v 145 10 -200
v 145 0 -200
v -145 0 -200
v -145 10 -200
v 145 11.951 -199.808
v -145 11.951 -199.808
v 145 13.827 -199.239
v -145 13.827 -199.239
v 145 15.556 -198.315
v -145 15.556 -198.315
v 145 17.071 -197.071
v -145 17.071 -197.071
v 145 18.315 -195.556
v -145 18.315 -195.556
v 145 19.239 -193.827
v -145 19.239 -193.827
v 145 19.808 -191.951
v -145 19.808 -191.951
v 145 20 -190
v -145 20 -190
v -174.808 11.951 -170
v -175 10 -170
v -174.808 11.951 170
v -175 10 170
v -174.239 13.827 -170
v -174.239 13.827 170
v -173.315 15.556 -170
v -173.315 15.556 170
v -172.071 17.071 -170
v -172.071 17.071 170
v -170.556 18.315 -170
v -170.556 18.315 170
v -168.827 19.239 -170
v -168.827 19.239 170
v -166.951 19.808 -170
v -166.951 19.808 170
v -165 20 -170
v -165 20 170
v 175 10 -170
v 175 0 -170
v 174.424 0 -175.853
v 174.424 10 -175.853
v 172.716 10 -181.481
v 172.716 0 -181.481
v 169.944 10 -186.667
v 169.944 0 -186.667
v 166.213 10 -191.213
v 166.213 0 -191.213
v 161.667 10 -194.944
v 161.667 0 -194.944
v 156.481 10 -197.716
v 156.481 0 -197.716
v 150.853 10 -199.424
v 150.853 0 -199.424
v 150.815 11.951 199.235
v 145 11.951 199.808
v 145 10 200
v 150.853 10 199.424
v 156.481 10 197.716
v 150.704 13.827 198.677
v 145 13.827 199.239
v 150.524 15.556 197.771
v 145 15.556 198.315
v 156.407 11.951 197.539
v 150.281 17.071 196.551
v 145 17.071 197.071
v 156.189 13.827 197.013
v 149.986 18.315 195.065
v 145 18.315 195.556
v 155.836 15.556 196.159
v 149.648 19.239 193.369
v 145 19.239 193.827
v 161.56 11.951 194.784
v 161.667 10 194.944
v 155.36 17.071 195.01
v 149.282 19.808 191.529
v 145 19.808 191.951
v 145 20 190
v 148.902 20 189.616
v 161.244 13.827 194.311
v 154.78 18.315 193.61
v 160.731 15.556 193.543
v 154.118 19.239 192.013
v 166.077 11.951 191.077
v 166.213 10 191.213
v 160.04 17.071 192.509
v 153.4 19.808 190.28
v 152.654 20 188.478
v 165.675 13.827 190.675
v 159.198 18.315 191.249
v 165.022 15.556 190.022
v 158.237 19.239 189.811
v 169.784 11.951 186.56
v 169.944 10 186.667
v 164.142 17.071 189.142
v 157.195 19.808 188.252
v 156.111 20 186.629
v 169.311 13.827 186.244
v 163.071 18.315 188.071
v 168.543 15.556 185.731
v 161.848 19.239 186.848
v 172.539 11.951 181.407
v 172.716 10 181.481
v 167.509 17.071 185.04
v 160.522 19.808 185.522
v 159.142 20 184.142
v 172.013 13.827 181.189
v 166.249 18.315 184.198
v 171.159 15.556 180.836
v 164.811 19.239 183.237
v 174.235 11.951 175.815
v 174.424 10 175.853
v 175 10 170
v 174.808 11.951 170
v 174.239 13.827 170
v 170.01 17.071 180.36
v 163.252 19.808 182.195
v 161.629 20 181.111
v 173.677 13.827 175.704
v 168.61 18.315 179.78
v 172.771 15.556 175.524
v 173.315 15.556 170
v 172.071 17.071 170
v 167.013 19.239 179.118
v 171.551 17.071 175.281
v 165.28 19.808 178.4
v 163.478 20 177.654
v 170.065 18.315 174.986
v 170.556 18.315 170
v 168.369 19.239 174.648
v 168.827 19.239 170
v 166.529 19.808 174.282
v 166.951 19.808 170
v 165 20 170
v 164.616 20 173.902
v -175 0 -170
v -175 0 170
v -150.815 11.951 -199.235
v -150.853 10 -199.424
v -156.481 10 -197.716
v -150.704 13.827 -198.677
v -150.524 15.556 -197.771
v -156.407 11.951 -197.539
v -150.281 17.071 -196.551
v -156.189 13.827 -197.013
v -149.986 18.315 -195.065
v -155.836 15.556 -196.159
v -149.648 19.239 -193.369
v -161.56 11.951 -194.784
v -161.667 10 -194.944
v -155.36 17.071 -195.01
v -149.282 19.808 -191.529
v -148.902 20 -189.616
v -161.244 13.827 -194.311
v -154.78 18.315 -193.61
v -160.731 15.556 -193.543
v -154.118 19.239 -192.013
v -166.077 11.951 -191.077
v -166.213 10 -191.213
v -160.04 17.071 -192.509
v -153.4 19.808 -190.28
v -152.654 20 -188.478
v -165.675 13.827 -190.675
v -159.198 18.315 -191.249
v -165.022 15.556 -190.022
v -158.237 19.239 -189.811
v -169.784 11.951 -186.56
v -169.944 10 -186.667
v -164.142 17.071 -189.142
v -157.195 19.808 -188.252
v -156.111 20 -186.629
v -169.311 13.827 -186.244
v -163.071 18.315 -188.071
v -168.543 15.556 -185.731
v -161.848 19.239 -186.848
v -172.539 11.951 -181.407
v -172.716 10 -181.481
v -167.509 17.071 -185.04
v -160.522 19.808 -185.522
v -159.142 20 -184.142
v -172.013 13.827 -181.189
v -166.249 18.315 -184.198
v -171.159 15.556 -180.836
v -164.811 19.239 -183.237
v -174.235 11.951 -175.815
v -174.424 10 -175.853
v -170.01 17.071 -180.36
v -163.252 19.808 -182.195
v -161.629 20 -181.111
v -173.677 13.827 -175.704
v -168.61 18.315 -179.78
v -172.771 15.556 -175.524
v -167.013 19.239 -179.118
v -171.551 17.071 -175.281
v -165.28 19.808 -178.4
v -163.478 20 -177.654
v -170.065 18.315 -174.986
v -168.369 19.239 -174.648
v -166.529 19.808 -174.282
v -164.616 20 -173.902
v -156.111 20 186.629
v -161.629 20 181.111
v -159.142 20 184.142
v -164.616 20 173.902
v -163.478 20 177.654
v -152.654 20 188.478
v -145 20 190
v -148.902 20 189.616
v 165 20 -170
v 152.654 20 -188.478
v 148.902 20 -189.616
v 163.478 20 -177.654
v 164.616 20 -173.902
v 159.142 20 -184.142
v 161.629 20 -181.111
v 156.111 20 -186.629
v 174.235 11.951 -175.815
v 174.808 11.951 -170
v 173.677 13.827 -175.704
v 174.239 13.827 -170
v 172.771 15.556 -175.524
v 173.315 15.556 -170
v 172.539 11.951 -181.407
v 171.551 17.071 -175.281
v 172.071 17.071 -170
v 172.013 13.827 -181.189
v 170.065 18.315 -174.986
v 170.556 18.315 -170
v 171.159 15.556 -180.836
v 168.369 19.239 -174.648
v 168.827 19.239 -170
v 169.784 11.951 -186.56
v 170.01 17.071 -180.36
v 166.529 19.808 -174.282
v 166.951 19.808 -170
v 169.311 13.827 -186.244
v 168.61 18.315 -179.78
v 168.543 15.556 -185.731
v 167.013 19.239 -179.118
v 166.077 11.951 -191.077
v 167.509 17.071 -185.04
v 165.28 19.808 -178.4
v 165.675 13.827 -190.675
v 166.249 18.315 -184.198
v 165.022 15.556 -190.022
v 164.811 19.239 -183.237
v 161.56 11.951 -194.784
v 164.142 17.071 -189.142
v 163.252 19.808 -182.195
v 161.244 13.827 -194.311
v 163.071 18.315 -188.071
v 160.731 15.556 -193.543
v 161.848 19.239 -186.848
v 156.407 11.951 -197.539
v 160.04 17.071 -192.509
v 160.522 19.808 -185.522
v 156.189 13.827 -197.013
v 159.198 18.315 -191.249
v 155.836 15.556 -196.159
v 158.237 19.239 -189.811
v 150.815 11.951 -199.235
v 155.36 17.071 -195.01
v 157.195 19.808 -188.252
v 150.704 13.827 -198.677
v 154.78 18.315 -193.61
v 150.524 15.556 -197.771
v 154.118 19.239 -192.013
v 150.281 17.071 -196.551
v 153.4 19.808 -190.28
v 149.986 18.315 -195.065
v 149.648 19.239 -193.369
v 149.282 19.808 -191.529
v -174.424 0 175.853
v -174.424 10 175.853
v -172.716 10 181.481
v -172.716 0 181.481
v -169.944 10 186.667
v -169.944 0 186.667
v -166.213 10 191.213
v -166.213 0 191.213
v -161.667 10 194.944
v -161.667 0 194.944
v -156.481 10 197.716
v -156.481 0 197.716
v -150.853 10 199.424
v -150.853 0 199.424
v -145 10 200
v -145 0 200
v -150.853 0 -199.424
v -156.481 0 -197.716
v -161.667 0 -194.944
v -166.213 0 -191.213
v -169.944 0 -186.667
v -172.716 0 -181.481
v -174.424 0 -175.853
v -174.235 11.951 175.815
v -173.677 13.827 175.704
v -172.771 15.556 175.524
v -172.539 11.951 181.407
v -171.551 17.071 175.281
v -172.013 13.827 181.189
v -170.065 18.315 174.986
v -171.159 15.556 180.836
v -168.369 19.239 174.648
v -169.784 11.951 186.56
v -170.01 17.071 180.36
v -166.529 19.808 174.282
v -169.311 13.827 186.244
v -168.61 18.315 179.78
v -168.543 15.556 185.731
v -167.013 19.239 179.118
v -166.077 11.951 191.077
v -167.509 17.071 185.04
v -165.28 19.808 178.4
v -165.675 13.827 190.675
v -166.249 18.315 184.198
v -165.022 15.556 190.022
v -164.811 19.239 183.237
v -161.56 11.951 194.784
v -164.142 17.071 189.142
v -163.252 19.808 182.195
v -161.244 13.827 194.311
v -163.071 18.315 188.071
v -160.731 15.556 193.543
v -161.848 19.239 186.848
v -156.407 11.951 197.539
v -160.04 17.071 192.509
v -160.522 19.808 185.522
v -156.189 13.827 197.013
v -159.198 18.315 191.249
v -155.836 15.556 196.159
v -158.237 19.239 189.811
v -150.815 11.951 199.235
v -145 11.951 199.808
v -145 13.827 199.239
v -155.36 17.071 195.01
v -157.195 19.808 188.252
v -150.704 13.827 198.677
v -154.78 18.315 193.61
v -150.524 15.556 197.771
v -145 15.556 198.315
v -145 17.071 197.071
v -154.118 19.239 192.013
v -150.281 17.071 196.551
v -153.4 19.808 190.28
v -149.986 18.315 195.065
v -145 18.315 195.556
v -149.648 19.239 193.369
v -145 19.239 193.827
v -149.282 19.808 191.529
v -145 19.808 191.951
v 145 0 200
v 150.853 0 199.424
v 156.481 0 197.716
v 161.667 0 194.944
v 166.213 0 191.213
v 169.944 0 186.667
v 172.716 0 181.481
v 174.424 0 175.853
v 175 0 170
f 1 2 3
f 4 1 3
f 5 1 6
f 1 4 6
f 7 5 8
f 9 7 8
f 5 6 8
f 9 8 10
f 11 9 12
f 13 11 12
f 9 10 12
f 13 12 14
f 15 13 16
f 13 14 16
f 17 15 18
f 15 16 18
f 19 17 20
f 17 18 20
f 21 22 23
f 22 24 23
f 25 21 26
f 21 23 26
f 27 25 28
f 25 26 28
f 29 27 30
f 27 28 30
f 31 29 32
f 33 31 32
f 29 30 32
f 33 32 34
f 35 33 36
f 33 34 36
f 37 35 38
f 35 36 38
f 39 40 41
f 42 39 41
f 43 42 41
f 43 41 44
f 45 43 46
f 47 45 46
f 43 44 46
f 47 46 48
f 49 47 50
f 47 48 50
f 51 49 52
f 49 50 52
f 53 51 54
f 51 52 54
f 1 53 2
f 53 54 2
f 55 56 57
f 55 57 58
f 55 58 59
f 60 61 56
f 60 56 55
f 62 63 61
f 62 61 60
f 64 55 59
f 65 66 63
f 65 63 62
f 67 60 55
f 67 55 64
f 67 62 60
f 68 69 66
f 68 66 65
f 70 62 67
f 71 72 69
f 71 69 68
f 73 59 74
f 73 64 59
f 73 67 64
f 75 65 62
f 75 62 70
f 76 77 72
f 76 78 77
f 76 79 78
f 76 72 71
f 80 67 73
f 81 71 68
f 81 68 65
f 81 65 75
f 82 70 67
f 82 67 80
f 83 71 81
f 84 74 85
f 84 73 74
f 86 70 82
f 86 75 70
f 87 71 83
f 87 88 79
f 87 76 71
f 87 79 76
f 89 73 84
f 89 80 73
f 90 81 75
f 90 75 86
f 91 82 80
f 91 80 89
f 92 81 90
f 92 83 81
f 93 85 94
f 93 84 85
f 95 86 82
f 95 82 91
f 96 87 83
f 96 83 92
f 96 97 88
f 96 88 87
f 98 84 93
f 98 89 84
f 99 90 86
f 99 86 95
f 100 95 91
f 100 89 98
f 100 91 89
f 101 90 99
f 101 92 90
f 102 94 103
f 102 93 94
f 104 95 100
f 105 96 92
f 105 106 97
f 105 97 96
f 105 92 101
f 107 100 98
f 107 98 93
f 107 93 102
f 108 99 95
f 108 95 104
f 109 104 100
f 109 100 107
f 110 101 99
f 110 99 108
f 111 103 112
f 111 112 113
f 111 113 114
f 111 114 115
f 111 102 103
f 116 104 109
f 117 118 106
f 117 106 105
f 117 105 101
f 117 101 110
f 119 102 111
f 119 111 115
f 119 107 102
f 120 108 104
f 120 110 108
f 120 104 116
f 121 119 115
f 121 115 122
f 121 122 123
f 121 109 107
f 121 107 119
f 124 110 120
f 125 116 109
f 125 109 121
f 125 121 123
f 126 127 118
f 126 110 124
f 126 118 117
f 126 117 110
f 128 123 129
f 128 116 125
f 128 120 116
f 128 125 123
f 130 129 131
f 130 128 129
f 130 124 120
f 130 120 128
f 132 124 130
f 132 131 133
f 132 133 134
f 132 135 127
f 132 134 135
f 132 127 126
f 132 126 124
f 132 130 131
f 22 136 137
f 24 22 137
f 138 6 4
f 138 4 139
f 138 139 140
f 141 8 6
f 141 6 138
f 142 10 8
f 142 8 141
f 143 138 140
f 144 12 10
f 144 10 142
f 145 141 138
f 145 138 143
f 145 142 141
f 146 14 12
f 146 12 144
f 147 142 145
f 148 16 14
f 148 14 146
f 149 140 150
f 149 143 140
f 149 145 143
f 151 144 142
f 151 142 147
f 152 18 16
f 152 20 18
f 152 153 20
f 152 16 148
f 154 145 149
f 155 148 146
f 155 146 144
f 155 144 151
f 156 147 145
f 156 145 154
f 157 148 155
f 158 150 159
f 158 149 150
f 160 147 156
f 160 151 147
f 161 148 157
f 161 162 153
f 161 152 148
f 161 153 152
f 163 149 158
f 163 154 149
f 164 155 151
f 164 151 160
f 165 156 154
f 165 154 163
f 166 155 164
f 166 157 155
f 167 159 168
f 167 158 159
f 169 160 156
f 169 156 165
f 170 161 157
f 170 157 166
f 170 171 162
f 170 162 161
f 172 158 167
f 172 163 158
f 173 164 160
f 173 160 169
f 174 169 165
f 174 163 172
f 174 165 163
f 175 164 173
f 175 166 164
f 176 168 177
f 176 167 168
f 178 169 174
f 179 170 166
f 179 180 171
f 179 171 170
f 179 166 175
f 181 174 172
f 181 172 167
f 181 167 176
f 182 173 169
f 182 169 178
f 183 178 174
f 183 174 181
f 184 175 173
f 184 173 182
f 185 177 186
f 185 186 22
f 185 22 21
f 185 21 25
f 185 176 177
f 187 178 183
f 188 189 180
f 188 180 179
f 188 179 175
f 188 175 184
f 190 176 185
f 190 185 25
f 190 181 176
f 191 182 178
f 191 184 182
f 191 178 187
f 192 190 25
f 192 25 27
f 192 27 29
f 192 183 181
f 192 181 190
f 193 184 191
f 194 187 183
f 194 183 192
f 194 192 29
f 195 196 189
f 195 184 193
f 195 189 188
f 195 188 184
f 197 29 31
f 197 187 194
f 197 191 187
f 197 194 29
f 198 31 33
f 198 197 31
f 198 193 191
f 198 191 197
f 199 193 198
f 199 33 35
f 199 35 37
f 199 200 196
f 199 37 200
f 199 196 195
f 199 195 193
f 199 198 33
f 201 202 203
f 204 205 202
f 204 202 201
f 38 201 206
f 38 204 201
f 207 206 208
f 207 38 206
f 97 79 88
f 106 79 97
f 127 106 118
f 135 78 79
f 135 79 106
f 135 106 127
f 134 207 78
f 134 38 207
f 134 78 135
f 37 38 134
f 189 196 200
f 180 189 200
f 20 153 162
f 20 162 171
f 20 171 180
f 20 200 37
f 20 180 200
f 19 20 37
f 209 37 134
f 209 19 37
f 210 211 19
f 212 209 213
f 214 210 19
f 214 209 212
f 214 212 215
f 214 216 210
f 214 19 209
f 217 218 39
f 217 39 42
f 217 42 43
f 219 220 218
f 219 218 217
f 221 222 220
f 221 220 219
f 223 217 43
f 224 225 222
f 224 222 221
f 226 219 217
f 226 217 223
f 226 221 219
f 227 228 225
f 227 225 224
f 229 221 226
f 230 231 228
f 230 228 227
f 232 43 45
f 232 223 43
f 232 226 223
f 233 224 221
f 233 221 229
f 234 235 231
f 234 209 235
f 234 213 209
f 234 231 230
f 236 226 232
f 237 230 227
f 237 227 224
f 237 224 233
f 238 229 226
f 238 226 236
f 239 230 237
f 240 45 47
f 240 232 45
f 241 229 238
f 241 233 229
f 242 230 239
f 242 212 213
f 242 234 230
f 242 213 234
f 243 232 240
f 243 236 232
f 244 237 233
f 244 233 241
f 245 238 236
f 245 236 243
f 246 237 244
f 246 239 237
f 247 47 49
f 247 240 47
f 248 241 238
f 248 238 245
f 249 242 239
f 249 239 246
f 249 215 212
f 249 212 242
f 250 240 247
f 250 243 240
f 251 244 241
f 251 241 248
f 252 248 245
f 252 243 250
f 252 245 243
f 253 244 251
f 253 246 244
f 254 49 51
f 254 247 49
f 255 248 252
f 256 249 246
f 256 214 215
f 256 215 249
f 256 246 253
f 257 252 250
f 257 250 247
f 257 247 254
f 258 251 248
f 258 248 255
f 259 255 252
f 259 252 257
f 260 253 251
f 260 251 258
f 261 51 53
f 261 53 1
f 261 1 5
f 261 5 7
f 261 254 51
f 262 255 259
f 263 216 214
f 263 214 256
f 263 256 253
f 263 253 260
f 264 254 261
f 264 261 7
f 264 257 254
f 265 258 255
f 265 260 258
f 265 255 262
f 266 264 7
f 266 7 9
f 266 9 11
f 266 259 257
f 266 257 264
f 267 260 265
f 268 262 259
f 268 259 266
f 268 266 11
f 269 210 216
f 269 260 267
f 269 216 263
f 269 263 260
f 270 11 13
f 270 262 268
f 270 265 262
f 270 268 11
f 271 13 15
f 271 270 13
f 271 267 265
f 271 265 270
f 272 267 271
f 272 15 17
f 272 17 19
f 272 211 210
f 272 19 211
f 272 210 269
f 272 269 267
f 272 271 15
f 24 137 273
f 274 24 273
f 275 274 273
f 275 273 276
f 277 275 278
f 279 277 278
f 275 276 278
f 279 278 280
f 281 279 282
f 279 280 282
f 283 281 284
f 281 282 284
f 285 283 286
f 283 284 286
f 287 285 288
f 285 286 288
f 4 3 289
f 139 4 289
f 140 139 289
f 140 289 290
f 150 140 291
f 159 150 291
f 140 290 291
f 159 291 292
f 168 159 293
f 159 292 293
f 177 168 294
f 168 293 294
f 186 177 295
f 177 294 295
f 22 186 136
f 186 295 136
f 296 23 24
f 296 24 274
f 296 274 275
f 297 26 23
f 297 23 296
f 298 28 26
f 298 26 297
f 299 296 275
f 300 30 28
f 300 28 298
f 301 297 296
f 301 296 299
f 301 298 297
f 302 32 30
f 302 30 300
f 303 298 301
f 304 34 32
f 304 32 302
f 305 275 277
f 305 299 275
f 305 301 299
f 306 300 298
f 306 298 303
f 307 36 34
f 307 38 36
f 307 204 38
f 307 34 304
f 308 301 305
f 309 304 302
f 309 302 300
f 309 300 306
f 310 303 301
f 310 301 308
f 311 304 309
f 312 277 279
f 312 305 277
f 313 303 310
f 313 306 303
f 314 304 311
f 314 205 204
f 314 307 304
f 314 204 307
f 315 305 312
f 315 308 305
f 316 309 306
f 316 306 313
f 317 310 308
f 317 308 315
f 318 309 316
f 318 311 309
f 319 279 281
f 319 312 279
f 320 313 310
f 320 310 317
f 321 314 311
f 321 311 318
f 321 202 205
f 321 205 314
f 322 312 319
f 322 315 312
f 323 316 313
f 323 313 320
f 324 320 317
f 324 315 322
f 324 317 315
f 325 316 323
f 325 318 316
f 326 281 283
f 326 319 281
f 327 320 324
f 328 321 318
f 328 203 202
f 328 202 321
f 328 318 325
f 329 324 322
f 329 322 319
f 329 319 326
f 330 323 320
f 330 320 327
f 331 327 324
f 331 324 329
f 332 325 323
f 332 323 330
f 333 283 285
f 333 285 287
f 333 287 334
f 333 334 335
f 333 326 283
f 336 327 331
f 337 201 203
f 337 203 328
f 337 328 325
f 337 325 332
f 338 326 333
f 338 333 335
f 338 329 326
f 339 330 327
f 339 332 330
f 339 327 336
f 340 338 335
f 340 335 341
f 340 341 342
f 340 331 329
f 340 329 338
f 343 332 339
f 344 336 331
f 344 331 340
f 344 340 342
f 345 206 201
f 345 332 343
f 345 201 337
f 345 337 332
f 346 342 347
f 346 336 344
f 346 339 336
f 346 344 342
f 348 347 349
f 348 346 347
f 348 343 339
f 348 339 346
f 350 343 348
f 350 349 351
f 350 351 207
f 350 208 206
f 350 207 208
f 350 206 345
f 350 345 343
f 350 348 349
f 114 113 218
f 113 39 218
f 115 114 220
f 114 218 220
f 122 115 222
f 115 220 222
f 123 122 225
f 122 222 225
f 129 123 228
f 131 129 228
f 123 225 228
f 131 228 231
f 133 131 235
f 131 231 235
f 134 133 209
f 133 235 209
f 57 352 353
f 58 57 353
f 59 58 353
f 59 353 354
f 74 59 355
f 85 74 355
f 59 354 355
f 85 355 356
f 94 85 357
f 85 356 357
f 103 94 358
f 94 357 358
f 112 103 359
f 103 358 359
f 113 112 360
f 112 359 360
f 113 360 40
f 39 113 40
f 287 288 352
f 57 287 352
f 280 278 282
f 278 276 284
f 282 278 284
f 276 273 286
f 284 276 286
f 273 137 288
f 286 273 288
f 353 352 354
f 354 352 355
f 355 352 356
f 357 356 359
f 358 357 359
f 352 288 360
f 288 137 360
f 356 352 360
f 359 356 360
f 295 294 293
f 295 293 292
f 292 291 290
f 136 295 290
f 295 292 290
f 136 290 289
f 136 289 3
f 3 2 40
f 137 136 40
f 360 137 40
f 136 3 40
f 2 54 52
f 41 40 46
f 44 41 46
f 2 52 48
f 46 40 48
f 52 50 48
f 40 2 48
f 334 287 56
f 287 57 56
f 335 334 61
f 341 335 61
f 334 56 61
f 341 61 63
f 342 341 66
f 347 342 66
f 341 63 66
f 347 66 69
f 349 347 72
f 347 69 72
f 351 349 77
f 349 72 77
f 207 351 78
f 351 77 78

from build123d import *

# Parameters (mm, degrees)
BOSS_EXTRUDE1_DEPTH = 20
FILLET1_R           = 10


with BuildPart() as part:
    # Sketch1 → Boss-Extrude1 (new body)
    with BuildSketch(Plane(origin=(0, 0, 0), x_dir=(1, 0, 0), z_dir=(0, 1, 0))):
        with BuildLine():
            Line((-145, -200), (145, -200))
            ThreePointArc((145, -200), (166.213203436, -191.213203436), (175, -170))
            Line((175, -170), (175, 170))
            ThreePointArc((175, 170), (166.213203436, 191.213203436), (145, 200))
            Line((145, 200), (-145, 200))
            ThreePointArc((-145, 200), (-166.213203436, 191.213203436), (-175, 170))
            Line((-175, 170), (-175, -170))
            ThreePointArc((-175, -170), (-166.213203436, -191.213203436), (-145, -200))
        make_face()
    extrude(amount=BOSS_EXTRUDE1_DEPTH)

    # Fillet1
    fillet1_edges = [part.edges().sort_by_distance(p)[0] for p in [
        (166.213203436, 20, 191.213203436),
        (175, 20, 0),
        (166.213203436, 20, -191.213203436),
        (0, 20, -200),
        (-166.213203436, 20, -191.213203436),
        (-175, 20, 0),
        (-166.213203436, 20, 191.213203436),
        (0, 20, 200),
    ]]
    fillet(fillet1_edges, radius=FILLET1_R)


solid = part.part
